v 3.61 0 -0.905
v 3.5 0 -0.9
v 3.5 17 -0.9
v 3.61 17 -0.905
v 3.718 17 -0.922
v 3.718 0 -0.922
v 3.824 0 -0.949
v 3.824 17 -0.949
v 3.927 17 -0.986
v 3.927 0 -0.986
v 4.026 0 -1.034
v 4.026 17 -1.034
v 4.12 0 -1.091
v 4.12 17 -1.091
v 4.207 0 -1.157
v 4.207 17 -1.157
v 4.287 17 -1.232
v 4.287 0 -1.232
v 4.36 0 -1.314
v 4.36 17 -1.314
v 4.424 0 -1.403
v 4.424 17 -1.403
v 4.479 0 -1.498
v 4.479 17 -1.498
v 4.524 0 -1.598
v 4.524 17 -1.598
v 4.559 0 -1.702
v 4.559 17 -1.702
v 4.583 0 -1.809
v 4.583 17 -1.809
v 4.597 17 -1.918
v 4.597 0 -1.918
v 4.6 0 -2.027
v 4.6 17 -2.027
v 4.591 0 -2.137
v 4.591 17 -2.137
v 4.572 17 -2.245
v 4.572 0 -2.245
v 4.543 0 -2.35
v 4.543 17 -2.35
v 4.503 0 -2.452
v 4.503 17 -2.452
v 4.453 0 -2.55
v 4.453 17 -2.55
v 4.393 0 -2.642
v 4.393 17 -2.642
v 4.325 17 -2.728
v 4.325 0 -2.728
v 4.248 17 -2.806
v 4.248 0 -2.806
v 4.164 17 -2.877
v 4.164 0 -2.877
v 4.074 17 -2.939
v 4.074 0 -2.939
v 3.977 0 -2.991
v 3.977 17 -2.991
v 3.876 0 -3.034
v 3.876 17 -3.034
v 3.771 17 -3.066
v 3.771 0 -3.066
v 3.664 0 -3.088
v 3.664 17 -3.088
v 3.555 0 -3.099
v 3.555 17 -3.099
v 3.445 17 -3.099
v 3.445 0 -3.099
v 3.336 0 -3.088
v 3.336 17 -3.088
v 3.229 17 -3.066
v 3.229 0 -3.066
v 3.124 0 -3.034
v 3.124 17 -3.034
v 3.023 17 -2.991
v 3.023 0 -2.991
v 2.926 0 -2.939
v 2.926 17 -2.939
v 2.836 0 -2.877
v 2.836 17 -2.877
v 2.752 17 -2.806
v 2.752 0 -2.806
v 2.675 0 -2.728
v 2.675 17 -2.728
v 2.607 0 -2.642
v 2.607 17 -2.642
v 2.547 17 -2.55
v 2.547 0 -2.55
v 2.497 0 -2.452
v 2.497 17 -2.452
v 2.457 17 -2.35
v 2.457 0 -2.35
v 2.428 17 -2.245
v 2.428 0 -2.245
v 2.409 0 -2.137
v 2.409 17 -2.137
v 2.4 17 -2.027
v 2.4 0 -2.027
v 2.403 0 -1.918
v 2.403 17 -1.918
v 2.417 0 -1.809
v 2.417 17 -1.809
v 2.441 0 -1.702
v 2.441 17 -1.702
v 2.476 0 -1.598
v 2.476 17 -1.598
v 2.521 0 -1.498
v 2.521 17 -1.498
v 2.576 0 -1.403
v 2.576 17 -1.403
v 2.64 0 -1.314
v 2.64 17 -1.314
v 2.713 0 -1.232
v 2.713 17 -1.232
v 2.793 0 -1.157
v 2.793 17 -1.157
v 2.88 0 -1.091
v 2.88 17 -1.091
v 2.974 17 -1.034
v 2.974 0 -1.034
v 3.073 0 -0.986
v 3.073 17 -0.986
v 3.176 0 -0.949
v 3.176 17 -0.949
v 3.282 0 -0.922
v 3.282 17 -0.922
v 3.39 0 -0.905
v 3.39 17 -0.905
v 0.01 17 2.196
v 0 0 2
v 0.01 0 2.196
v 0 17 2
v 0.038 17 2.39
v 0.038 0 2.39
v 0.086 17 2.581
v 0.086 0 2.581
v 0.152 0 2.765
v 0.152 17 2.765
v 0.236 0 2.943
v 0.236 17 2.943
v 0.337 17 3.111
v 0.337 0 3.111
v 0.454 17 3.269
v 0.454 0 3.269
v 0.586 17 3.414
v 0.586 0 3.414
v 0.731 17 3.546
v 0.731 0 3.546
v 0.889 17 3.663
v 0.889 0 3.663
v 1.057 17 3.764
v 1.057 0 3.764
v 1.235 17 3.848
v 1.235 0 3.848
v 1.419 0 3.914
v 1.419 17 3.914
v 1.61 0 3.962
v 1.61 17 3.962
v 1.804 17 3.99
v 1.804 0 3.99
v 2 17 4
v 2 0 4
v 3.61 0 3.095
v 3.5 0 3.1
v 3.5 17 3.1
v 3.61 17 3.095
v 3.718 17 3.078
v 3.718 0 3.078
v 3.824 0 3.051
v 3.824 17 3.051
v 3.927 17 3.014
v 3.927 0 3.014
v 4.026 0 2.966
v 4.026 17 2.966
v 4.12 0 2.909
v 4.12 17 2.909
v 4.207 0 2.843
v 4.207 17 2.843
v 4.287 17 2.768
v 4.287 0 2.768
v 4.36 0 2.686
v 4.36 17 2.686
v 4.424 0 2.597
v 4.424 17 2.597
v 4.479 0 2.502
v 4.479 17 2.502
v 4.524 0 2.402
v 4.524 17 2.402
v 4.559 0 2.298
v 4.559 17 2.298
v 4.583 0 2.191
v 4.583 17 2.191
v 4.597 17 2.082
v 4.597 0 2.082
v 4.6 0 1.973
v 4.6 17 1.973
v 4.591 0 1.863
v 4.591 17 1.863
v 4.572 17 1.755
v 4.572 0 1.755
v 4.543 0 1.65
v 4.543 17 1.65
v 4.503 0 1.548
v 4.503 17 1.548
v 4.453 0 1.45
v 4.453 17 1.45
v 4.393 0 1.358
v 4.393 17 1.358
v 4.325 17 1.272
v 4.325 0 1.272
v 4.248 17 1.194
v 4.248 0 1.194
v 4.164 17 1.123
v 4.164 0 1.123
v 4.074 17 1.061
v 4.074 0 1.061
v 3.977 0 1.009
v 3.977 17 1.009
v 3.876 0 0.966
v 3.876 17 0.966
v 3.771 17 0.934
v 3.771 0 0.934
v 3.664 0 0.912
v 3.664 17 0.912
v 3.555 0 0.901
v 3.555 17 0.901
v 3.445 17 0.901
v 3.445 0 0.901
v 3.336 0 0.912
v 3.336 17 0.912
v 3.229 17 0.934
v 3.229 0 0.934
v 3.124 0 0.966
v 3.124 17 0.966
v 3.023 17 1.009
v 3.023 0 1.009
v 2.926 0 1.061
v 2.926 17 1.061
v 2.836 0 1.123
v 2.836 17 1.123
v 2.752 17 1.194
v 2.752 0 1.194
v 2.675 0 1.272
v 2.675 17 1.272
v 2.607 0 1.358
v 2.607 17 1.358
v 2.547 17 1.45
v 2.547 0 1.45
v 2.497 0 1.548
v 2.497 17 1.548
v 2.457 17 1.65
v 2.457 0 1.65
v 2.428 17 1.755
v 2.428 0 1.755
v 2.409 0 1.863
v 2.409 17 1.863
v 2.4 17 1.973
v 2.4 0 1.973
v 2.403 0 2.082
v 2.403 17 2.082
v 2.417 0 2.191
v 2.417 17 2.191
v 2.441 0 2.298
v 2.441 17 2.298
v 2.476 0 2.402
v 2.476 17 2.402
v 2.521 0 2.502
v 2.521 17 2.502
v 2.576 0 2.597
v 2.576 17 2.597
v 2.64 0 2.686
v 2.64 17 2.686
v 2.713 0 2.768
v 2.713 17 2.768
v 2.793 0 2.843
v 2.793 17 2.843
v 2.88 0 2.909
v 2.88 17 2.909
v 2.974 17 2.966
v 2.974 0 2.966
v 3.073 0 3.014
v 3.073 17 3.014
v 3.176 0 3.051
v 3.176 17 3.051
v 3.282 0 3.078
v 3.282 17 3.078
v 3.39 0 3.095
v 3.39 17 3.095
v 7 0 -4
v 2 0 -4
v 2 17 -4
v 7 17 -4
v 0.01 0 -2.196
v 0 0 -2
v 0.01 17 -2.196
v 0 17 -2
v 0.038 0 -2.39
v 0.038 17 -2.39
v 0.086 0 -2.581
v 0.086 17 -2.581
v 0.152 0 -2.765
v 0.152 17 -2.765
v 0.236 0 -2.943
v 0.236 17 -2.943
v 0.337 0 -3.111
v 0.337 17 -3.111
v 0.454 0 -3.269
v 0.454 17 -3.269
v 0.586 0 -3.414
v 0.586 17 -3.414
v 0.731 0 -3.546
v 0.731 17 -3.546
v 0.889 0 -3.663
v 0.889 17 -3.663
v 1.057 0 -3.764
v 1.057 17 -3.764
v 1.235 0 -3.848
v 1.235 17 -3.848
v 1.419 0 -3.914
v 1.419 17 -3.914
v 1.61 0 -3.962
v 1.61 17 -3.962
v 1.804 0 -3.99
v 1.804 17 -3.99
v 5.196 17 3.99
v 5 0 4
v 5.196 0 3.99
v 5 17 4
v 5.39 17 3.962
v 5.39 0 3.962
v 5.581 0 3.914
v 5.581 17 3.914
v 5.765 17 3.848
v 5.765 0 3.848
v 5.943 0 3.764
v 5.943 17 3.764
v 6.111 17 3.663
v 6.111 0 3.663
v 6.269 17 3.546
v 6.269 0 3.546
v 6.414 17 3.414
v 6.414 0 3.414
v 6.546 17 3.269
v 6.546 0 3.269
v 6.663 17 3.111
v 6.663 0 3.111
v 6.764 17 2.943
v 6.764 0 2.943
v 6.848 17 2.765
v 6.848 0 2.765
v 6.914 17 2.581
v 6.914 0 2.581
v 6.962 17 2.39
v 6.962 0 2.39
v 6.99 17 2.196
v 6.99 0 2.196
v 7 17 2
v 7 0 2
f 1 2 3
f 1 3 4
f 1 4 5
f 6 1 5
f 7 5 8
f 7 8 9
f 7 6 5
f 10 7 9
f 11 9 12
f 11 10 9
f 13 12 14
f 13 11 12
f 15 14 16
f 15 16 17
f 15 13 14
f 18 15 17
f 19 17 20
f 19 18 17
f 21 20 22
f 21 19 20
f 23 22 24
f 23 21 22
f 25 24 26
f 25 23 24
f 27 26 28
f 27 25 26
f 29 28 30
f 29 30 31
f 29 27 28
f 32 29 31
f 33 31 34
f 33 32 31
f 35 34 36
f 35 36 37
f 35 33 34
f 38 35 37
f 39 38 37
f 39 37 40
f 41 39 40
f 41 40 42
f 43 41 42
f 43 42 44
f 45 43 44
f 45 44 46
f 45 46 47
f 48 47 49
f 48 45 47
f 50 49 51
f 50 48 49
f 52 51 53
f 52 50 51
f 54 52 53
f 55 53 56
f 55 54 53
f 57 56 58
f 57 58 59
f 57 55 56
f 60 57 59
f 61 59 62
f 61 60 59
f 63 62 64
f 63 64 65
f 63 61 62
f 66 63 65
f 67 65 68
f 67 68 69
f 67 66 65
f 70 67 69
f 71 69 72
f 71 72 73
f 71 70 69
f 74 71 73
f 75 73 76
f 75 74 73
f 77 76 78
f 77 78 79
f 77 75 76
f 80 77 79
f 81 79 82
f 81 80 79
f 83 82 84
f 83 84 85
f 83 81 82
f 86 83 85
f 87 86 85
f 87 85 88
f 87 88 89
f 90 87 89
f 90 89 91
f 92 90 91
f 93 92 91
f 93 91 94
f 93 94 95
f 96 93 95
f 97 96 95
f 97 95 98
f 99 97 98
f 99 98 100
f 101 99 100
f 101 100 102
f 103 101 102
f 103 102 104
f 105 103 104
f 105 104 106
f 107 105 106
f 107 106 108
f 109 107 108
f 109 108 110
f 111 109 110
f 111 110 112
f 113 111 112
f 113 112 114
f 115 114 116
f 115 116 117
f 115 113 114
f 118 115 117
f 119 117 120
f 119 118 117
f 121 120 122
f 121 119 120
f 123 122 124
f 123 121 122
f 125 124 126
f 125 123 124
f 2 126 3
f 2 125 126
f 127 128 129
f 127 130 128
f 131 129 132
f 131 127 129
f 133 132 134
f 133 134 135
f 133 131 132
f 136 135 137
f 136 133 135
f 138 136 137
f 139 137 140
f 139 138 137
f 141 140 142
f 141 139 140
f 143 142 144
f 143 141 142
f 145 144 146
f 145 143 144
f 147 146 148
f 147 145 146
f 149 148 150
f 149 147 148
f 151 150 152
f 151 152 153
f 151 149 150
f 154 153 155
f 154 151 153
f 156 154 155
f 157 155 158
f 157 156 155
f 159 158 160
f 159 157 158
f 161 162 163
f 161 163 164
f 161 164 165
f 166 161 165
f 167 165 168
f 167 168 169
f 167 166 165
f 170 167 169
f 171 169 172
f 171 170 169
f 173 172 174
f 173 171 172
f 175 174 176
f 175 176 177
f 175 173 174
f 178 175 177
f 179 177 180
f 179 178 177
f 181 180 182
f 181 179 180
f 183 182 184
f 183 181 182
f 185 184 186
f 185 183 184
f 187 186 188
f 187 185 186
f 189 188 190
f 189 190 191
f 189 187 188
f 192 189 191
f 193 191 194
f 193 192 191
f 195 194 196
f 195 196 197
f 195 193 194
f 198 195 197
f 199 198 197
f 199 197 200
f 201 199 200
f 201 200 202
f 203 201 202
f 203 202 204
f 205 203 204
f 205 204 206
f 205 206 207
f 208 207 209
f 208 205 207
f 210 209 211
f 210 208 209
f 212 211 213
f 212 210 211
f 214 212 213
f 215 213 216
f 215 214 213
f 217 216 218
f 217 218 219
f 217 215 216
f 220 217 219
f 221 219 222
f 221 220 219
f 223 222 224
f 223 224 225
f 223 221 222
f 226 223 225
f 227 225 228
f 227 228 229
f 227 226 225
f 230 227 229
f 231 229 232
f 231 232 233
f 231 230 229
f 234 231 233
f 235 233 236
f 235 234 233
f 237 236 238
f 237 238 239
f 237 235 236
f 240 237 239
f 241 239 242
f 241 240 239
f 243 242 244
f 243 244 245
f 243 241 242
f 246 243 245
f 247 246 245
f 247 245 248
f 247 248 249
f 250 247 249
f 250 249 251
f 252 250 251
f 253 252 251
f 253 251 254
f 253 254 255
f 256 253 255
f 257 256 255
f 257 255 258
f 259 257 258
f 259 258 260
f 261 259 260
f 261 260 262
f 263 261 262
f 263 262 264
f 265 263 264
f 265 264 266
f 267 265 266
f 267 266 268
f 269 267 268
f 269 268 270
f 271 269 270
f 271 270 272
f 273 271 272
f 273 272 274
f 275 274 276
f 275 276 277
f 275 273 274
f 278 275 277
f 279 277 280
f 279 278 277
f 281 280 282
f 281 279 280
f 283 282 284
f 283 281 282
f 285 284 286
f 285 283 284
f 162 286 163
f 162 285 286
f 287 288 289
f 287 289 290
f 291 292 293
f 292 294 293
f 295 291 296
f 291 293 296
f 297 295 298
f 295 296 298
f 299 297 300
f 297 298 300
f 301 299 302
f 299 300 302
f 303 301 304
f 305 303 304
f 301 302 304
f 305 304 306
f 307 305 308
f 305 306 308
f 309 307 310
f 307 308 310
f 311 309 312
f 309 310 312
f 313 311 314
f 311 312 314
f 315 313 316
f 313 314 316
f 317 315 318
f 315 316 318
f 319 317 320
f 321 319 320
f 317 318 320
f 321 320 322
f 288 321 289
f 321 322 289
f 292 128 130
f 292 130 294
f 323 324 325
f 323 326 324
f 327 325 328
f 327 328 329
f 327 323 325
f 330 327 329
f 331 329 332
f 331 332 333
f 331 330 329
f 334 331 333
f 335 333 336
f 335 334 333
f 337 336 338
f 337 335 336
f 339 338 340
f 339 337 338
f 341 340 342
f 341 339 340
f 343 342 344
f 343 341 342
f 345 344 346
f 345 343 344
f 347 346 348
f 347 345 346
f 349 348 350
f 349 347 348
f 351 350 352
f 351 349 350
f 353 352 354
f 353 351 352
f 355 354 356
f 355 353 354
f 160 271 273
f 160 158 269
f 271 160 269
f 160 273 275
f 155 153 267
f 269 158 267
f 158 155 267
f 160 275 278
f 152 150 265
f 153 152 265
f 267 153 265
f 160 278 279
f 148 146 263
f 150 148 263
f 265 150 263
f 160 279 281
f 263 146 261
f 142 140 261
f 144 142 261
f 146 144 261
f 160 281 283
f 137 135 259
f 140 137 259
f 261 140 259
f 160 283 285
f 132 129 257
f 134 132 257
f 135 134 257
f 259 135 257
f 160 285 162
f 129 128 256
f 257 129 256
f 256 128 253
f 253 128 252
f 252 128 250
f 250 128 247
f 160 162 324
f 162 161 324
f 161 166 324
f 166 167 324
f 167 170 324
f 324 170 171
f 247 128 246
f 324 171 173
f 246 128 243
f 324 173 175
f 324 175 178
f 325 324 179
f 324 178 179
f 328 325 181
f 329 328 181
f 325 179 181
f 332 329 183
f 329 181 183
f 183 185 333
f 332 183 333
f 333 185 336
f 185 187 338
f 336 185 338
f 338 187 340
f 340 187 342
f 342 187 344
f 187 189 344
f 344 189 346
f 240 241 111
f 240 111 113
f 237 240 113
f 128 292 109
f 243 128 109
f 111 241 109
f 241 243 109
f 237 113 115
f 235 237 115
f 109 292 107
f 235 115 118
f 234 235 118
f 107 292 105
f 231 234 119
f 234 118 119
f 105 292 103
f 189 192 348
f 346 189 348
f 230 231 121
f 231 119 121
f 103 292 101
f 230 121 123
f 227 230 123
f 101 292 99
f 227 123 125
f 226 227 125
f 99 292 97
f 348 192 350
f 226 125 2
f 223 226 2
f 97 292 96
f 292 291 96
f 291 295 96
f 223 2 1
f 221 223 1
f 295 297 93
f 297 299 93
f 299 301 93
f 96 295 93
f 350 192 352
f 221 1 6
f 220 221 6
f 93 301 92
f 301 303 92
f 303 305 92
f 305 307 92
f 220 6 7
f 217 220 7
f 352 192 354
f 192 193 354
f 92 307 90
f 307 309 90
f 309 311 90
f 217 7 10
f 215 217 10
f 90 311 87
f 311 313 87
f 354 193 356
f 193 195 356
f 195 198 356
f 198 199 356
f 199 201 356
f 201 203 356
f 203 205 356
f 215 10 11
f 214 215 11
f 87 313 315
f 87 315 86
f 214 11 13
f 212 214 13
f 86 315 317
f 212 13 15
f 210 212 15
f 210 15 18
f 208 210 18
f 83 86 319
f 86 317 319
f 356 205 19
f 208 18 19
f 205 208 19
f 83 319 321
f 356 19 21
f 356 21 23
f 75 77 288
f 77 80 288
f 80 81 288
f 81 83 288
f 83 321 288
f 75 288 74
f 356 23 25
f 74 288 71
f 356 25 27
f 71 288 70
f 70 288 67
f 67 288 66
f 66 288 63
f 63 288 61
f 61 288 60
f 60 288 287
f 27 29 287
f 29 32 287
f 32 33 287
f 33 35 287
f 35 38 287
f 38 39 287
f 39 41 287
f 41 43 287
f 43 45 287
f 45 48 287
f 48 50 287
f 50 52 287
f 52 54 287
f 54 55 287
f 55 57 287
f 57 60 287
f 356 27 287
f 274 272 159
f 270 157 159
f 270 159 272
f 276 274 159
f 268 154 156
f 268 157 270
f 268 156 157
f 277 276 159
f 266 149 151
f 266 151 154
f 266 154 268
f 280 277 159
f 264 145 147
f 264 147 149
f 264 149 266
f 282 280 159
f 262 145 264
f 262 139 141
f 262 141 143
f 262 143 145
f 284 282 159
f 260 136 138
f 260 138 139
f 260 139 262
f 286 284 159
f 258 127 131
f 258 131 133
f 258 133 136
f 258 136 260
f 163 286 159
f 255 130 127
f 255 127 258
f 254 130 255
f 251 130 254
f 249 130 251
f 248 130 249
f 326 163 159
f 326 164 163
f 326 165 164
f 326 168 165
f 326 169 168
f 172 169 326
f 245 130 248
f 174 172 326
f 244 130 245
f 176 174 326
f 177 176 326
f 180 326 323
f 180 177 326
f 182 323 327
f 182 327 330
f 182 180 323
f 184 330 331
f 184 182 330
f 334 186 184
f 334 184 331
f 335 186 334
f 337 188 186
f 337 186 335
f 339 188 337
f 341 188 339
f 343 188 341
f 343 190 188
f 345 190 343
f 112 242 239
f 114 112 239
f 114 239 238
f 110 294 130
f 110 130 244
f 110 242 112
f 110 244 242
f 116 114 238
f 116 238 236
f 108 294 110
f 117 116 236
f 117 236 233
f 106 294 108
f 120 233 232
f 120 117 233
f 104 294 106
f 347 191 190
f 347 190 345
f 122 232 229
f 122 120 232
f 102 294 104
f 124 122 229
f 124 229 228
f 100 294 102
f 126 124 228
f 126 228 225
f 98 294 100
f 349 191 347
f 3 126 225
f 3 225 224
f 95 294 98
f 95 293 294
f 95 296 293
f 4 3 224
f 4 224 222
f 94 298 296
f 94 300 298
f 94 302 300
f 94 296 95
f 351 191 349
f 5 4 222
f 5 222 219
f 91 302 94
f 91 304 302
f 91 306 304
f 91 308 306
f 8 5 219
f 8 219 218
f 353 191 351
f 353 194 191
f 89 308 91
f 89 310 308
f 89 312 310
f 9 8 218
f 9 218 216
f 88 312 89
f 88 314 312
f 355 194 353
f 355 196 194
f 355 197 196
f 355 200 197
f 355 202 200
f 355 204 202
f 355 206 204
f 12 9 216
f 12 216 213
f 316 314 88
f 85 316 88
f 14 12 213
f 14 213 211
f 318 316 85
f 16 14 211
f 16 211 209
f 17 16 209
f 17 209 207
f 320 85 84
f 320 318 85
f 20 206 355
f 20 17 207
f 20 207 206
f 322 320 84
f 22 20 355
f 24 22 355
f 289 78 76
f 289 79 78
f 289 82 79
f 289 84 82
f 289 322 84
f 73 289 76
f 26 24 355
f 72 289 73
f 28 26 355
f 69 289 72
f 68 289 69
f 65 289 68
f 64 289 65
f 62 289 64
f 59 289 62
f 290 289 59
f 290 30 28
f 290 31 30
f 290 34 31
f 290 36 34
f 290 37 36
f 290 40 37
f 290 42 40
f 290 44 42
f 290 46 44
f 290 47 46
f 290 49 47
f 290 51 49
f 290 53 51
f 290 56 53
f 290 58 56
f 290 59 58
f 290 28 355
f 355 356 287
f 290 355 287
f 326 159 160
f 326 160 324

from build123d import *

# Parameters (mm, degrees)
SKETCH_1_W      = 7
SKETCH_1_H      = 8
SKETCH_1_R      = 1.1
EXTRUDE_1_DEPTH = 17
FILLET_1_R      = 2


with BuildPart() as part:
    # 草图1 → 凸台-拉伸1 (new body)
    with BuildSketch(Plane(origin=(0, 0, 0), x_dir=(1, 0, 0), z_dir=(0, 1, 0))):
        with Locations((3.5, 0)):
            Rectangle(SKETCH_1_W, SKETCH_1_H)
        with Locations(Location((3.5, -2, 0), (0, 0, 270))):
            Circle(SKETCH_1_R, mode=Mode.SUBTRACT)
        with Locations(Location((3.5, 2, 0), (0, 0, 270))):
            Circle(SKETCH_1_R, mode=Mode.SUBTRACT)
    extrude(amount=EXTRUDE_1_DEPTH)

    # 圆角1
    fillet_1_edges = [part.edges().sort_by_distance(p)[0] for p in [
        (7, 8.5, 4),
        (0, 8.5, 4),
        (0, 8.5, -4),
    ]]
    fillet(fillet_1_edges, radius=FILLET_1_R)


solid = part.part
